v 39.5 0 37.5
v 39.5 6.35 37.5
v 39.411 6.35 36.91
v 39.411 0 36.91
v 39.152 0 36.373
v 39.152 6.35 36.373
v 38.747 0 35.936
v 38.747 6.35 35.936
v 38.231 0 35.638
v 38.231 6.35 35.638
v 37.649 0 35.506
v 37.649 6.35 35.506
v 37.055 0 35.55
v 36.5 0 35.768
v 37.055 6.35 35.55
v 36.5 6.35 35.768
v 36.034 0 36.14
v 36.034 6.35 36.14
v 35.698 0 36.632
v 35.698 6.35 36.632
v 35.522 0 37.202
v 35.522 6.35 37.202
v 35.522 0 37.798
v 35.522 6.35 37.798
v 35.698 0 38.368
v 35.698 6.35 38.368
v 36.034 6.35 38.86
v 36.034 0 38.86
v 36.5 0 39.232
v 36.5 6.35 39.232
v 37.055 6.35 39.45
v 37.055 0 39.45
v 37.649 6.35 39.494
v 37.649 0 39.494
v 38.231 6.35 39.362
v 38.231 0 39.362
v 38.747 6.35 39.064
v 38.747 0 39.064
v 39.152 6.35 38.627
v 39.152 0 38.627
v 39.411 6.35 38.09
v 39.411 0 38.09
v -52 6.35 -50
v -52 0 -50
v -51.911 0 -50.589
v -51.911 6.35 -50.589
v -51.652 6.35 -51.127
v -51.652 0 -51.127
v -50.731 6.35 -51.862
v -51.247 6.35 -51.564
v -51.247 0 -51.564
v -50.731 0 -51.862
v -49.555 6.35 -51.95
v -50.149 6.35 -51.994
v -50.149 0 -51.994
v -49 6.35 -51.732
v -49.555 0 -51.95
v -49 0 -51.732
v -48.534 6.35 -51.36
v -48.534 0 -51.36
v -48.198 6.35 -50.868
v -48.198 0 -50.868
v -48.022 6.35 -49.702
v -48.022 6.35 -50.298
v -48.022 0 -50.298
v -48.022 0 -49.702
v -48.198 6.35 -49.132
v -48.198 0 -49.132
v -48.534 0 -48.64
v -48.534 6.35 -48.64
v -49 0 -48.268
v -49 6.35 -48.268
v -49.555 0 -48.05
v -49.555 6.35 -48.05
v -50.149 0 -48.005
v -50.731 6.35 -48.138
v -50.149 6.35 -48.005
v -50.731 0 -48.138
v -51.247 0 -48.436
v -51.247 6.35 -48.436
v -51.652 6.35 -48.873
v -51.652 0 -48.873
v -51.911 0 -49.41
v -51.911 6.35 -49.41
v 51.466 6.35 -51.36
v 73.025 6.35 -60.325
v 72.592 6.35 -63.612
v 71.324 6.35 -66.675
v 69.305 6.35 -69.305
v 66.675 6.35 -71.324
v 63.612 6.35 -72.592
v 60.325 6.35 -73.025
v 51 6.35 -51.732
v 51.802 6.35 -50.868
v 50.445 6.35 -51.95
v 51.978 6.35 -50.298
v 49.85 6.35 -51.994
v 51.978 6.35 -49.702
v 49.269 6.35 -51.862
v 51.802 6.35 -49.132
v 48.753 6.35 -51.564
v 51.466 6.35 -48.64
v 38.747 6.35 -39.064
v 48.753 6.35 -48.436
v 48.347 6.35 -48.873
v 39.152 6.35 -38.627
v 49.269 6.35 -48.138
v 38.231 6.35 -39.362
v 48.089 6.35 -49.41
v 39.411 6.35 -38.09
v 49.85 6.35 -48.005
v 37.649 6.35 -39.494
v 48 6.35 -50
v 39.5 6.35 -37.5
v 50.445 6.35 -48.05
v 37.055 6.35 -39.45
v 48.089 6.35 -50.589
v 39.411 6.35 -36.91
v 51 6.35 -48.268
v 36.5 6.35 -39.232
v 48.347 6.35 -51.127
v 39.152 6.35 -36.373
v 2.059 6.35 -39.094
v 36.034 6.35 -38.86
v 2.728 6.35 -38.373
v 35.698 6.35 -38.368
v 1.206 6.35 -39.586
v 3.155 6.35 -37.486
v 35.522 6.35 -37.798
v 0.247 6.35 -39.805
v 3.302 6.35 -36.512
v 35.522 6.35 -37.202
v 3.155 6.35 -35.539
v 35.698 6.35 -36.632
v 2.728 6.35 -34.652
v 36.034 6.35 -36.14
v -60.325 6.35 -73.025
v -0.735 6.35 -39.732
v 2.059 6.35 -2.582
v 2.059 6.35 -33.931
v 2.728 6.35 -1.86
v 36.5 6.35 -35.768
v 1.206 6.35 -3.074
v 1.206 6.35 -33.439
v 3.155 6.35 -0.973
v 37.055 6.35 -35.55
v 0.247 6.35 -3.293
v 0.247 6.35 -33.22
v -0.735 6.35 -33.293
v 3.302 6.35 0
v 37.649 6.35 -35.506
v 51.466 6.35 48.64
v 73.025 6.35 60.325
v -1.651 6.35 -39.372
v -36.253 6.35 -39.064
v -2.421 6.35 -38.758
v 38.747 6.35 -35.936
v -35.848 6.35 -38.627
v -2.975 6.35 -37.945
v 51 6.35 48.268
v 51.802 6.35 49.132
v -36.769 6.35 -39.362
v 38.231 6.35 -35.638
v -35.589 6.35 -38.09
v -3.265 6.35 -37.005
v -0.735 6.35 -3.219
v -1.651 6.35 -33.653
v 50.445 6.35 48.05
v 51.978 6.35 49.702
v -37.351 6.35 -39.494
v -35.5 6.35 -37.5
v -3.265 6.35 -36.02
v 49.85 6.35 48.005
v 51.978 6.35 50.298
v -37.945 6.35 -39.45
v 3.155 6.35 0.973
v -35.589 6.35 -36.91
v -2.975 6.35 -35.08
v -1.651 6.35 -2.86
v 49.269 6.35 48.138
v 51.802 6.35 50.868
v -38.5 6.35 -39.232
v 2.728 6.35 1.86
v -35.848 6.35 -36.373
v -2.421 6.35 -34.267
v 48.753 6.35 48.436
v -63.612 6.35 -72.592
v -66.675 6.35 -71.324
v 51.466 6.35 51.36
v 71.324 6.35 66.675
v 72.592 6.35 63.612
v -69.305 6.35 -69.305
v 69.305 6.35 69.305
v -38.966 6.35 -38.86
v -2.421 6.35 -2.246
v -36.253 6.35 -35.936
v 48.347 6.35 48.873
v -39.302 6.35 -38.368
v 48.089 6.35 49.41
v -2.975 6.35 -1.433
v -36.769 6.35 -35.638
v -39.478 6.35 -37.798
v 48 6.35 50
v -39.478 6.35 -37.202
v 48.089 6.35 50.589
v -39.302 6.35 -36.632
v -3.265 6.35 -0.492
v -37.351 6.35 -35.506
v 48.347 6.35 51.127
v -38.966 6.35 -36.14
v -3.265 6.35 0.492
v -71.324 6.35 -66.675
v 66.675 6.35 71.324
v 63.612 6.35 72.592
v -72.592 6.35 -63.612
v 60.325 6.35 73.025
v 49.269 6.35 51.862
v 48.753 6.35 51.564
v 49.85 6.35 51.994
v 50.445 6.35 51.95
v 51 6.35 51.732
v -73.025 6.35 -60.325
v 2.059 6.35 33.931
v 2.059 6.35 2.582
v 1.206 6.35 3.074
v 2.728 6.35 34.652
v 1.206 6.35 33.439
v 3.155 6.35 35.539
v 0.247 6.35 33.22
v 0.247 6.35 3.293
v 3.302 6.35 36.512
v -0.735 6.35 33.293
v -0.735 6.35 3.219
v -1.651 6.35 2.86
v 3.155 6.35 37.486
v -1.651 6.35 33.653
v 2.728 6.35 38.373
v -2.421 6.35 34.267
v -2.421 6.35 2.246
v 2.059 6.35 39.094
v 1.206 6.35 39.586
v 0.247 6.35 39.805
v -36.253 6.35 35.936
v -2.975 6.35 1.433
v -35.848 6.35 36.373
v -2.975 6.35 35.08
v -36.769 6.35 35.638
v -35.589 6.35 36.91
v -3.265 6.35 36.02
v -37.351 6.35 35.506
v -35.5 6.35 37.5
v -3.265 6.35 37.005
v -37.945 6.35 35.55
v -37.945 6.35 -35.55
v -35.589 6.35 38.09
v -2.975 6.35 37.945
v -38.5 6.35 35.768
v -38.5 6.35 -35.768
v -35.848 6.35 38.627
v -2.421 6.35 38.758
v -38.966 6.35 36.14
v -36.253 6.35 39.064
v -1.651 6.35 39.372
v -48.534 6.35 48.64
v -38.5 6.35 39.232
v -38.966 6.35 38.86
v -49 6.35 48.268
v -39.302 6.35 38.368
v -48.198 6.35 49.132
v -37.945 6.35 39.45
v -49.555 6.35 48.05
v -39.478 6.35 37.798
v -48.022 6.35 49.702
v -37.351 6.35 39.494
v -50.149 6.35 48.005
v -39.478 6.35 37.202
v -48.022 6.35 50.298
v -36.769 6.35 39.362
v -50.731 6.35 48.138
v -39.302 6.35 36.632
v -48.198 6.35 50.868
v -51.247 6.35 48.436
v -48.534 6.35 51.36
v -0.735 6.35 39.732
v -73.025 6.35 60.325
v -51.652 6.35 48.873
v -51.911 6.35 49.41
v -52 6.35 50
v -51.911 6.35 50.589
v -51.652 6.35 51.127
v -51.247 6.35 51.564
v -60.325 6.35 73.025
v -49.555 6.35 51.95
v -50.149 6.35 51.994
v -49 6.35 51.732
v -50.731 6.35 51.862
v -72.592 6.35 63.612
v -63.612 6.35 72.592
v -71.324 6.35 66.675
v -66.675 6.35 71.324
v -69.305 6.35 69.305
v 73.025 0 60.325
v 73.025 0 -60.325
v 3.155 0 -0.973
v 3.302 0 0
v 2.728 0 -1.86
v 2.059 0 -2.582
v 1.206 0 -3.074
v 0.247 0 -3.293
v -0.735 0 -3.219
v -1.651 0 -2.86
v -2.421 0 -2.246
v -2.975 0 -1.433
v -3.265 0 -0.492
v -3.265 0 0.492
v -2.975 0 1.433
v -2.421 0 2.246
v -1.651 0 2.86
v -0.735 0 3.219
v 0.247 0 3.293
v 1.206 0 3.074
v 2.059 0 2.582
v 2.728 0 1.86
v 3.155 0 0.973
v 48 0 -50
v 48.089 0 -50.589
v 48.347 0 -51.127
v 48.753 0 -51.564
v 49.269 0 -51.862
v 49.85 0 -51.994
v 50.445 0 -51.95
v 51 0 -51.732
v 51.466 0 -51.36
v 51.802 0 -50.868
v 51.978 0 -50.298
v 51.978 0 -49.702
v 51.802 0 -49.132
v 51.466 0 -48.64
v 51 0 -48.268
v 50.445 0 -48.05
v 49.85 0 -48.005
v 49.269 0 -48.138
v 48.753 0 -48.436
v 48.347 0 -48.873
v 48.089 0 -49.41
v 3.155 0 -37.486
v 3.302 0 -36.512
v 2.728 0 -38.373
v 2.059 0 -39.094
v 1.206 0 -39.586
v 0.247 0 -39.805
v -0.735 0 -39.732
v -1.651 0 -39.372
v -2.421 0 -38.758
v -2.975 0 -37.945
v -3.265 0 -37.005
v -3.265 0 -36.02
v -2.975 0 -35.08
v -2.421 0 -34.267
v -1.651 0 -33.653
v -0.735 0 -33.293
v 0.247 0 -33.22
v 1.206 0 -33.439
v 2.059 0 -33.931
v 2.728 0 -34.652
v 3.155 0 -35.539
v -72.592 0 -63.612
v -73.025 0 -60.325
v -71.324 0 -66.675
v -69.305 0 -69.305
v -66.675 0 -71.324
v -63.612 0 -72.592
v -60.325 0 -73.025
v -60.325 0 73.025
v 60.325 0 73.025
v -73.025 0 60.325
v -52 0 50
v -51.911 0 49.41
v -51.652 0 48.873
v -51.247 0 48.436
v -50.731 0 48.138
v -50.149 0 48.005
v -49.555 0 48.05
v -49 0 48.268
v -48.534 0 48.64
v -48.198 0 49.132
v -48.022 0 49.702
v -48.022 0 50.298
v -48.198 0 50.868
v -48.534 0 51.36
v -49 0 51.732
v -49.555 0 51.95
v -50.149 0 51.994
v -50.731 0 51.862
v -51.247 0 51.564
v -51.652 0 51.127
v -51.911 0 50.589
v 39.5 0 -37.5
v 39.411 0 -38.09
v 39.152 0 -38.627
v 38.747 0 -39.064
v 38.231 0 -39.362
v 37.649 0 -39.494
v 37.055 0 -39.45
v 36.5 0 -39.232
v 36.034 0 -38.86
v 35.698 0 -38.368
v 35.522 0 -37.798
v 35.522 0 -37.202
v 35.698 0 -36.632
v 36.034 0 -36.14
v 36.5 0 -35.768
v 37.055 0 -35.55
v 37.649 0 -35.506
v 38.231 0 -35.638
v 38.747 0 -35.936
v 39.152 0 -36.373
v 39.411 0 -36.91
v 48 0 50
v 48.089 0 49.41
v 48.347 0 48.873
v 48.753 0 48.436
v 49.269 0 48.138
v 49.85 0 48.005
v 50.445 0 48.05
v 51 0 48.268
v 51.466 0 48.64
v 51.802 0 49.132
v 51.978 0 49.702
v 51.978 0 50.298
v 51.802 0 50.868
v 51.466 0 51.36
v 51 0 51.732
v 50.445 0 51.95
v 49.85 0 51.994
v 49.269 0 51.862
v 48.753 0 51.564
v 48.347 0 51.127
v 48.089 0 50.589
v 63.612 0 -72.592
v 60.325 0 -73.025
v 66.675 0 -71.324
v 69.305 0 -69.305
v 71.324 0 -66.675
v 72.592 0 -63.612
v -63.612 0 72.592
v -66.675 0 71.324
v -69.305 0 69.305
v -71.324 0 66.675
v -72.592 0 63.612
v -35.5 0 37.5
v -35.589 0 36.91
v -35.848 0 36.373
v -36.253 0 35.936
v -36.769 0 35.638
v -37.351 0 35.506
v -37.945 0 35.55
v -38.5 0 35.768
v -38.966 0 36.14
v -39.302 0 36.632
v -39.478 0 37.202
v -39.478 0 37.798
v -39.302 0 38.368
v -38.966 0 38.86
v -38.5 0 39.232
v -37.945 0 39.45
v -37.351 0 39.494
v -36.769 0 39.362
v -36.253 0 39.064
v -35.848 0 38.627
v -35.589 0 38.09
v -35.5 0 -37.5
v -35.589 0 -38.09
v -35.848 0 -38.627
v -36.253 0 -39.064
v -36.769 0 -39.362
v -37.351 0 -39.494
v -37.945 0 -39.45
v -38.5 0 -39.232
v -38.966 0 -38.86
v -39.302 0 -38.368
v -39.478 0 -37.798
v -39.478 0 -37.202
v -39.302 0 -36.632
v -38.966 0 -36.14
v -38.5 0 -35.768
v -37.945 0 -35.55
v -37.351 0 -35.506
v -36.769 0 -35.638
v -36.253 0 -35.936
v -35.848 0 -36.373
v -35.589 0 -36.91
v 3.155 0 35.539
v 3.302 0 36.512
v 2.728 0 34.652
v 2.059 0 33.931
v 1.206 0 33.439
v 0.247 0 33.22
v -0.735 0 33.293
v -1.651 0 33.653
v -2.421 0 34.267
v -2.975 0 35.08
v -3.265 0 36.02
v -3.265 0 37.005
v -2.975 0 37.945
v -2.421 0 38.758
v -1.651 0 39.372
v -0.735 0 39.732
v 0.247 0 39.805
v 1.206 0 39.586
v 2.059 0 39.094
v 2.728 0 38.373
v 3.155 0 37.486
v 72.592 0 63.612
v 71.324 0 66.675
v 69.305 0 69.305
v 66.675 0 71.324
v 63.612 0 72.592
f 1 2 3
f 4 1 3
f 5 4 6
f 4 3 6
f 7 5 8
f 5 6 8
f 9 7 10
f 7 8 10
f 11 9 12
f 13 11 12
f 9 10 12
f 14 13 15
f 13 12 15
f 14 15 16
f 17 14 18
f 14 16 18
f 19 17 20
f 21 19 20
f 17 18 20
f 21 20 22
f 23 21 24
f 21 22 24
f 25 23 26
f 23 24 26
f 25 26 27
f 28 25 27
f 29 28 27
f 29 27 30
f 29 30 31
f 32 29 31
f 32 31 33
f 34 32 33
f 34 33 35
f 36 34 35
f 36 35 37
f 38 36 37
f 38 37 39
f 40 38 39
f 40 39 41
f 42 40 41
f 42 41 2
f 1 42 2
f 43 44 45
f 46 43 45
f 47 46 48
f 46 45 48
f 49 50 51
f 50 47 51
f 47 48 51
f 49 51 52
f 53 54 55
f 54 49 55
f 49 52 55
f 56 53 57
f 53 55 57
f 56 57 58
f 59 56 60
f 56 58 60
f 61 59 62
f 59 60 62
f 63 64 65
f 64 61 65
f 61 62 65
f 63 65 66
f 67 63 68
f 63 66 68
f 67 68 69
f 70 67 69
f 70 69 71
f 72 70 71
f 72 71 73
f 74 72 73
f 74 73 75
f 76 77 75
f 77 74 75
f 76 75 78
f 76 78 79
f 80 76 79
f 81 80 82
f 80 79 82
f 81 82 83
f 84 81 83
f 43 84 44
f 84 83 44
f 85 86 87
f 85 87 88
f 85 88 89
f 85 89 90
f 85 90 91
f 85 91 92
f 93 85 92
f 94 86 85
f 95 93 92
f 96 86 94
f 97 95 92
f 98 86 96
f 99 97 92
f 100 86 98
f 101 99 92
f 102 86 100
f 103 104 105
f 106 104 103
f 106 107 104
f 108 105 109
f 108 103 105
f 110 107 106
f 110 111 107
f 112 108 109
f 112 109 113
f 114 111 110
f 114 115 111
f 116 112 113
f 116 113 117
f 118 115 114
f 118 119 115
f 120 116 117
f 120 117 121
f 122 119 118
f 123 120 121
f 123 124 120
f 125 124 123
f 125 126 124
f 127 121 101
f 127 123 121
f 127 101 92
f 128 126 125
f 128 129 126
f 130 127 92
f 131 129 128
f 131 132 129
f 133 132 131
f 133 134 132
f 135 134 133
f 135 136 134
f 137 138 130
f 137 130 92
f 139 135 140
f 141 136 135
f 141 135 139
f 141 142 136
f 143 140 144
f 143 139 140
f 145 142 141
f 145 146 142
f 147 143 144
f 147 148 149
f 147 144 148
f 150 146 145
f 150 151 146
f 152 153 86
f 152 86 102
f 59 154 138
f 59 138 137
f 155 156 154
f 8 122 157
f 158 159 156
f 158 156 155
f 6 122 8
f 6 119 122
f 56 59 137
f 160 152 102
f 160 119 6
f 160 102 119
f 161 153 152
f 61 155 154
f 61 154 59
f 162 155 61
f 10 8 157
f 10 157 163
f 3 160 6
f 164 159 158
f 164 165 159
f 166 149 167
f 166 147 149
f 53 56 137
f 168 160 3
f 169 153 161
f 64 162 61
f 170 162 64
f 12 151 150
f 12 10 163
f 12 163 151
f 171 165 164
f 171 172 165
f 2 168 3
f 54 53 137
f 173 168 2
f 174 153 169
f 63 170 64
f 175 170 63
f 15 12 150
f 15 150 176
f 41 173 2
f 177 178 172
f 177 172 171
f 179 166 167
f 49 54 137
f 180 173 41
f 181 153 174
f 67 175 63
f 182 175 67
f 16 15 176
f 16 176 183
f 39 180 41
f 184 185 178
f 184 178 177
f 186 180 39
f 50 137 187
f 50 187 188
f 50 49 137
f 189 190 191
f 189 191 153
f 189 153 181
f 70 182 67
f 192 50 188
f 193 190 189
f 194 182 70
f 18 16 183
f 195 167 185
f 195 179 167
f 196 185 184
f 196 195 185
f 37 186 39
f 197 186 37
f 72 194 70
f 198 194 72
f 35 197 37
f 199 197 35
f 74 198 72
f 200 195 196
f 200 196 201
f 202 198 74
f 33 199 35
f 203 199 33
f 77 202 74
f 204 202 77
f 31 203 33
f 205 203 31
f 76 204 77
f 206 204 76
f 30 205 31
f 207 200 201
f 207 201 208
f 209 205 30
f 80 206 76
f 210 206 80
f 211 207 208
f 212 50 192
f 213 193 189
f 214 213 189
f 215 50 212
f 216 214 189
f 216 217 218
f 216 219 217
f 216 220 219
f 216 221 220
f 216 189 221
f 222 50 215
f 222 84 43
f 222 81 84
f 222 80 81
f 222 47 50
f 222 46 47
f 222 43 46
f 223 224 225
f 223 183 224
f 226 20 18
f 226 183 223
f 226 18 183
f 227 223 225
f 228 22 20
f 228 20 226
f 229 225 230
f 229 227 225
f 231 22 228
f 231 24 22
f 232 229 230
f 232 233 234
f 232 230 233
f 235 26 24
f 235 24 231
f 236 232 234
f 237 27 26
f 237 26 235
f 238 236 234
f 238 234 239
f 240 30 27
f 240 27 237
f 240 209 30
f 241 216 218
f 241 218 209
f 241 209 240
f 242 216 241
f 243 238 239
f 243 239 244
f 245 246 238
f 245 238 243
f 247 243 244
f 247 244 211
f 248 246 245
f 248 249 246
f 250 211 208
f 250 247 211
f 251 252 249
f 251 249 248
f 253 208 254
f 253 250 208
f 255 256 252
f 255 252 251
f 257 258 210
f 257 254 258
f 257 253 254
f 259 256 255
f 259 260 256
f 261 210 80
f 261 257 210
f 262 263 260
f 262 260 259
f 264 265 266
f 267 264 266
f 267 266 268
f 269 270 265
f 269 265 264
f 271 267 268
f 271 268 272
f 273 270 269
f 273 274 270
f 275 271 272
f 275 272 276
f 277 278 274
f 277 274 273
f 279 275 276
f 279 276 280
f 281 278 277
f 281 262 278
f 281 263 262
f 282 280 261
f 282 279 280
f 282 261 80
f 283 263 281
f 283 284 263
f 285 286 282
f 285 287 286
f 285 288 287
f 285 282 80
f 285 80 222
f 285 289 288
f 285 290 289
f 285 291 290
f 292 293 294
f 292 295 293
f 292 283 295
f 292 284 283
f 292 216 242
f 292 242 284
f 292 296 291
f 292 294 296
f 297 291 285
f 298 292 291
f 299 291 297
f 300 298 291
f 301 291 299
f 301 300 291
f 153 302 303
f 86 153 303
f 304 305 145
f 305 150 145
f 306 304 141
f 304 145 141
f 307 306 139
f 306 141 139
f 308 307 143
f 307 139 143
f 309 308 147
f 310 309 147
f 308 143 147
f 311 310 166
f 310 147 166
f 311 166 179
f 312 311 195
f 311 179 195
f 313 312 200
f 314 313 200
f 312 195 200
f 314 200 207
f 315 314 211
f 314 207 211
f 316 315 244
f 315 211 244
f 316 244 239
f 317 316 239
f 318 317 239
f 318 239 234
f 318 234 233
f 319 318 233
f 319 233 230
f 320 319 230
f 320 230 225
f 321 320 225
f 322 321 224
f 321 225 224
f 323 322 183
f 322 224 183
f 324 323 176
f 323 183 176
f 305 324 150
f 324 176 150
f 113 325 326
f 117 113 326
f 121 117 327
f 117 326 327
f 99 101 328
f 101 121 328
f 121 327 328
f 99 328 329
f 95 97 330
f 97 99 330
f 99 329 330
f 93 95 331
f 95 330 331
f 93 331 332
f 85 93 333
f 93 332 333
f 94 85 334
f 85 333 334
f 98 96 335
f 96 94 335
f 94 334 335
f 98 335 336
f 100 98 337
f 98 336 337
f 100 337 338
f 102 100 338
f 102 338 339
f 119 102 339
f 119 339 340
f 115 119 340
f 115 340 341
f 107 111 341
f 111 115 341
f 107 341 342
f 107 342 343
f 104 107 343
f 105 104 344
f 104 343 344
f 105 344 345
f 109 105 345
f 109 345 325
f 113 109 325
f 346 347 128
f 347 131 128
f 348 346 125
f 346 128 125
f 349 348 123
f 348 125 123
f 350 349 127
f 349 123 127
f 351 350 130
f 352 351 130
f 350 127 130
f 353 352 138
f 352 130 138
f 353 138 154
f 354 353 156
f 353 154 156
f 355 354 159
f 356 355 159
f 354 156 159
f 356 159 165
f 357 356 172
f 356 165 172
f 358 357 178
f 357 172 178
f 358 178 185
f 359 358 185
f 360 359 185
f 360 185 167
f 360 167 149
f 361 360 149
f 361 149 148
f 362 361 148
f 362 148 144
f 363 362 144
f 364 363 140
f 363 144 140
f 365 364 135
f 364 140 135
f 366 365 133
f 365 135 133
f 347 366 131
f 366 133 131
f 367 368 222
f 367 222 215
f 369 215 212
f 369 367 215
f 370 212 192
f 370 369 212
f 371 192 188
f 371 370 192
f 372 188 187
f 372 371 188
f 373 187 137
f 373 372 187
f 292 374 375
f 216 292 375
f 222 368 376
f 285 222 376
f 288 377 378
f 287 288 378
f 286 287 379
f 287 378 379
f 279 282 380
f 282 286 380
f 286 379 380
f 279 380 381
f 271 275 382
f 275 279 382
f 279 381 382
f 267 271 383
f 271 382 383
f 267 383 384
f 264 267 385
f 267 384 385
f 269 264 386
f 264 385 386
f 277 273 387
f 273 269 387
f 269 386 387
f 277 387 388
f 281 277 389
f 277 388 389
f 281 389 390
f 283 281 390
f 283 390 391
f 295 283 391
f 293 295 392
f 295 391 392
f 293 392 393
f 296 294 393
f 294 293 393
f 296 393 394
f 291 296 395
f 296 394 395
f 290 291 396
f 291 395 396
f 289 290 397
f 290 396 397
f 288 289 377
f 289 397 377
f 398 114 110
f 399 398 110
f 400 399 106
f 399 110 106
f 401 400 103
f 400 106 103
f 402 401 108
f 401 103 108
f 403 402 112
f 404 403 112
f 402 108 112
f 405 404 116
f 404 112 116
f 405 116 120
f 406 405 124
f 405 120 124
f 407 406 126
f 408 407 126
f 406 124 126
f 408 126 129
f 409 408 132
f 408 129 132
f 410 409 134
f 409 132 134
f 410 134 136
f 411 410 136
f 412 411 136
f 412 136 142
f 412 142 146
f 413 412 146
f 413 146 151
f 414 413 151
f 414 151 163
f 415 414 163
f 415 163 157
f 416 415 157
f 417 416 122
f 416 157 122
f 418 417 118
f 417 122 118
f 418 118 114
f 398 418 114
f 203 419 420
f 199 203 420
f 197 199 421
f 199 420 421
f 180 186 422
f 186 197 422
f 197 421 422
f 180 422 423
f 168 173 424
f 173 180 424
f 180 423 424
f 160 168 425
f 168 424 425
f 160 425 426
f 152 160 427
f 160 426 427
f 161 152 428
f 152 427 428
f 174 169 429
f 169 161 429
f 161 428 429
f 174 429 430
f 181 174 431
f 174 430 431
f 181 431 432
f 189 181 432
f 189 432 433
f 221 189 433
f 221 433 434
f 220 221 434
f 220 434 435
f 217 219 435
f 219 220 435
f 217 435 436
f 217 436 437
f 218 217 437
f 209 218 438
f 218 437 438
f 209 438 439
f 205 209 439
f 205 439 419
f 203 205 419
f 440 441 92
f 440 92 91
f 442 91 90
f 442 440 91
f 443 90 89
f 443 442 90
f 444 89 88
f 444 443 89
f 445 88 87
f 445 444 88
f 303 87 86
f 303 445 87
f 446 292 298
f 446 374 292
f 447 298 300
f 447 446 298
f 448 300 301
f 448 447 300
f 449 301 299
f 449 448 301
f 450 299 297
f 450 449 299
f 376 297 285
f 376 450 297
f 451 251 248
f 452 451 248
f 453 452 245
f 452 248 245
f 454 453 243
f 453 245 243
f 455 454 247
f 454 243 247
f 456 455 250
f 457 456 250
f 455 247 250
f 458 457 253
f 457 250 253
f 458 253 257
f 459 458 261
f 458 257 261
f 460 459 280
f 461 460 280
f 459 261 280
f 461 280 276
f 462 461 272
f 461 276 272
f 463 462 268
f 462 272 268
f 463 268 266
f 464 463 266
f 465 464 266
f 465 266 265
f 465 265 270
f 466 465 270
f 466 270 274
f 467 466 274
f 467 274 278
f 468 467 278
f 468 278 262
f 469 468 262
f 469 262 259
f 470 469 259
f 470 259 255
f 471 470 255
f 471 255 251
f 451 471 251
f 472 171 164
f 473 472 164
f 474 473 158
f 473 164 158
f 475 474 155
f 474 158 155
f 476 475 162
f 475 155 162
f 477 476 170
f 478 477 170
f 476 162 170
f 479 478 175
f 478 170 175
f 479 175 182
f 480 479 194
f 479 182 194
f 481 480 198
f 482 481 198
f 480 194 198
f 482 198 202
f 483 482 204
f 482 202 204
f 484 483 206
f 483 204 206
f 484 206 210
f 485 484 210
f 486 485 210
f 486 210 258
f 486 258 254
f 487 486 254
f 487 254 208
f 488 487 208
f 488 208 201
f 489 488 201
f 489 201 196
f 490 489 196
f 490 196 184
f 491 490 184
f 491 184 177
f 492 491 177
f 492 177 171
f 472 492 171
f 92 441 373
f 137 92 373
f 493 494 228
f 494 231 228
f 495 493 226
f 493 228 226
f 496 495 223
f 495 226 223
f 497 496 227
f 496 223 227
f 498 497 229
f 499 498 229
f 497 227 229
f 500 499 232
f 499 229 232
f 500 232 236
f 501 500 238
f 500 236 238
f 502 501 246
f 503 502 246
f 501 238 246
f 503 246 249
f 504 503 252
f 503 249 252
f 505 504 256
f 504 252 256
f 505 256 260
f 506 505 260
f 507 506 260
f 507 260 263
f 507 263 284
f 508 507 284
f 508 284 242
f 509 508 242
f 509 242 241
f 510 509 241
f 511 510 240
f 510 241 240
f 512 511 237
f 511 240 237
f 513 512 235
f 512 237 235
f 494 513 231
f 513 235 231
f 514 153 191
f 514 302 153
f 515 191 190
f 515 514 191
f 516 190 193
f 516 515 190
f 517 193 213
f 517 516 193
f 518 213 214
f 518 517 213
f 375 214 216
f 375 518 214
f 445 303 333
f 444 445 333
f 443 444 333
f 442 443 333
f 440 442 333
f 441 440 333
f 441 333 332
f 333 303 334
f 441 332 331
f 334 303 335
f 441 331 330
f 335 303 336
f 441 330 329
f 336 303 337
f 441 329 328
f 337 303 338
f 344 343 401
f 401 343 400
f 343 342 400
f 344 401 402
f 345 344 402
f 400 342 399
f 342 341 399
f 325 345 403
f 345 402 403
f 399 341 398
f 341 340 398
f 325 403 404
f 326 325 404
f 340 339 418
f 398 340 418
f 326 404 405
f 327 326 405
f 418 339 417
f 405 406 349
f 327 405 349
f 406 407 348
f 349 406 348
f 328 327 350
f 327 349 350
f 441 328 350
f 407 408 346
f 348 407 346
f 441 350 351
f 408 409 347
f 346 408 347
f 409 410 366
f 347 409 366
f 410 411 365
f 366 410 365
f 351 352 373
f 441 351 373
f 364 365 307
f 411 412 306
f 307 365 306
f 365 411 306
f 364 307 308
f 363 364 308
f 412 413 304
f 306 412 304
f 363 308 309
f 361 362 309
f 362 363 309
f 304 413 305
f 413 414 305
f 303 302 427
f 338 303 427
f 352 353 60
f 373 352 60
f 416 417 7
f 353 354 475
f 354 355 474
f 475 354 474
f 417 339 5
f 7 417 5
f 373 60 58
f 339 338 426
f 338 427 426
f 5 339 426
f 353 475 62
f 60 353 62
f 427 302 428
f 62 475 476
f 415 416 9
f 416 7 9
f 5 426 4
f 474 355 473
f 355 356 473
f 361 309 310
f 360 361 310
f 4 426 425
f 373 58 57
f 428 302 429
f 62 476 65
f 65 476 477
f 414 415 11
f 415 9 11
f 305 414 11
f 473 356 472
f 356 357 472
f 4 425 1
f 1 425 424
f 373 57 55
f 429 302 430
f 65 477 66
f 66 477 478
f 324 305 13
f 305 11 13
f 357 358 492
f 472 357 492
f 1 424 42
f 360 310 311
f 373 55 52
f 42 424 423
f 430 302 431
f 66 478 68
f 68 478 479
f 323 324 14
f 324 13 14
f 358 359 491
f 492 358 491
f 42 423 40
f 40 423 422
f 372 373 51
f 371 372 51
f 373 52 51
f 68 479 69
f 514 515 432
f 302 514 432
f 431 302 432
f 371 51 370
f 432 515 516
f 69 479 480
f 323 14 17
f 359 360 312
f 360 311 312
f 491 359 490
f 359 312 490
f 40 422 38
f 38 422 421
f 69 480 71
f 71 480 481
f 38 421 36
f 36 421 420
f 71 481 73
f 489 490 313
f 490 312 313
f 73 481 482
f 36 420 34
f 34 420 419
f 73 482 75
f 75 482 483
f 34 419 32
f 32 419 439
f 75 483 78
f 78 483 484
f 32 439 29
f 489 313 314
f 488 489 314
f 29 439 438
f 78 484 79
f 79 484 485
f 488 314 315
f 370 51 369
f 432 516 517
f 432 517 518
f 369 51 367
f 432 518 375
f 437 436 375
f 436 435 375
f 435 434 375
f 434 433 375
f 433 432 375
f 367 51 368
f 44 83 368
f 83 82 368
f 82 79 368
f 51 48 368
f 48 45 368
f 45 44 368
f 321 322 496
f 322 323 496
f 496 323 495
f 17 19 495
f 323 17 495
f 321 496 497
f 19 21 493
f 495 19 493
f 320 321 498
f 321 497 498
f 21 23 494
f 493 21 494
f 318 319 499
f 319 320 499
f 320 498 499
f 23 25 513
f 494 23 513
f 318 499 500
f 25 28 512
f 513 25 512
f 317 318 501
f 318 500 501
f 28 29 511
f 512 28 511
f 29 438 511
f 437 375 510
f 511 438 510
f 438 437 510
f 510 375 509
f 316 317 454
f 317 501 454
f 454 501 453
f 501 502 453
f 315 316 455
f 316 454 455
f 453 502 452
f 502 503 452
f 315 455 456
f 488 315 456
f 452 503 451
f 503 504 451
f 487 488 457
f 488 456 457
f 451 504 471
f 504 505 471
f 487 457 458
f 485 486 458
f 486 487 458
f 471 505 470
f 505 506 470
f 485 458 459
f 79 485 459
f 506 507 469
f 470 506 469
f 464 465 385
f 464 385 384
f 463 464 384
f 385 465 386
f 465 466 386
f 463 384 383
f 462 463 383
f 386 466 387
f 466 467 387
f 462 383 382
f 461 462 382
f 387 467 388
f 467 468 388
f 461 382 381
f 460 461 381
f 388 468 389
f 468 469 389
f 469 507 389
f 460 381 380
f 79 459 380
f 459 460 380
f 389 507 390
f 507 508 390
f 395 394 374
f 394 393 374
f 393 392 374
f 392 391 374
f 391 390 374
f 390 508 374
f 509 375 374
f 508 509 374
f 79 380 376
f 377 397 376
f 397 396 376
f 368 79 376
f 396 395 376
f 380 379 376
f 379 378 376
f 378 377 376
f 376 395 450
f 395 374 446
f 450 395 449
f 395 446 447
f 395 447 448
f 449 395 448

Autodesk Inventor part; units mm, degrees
ref_plane "YZ Plane" through (0, 0, 0) normal (1, 0, 0) x (0, 1, 0)
ref_plane "XZ Plane" through (0, 0, 0) normal (0, 1, 0) x (-1, 0, 0)
ref_plane "XY Plane" through (0, 0, 0) normal (0, 0, 1) x (1, 0, 0)
sketch "Sketch1" plane through (0, 0, 0) normal (0, 1, 0) x (-1, 0, 0)
  line L0 (60.325, 73.025) -> (-60.325, 73.025)
  line L1 (-73.025, 60.325) -> (-73.025, -60.325)
  line L2 (-60.325, -73.025) -> (60.325, -73.025)
  line L3 (73.025, -60.325) -> (73.025, 60.325)
  circle A0 centre (49.9999, 49.9999) radius 2
  circle A1 centre (49.9999, -49.9999) radius 2
  circle A2 centre (-49.9999, -49.9999) radius 2
  circle A3 centre (-49.9999, 49.9999) radius 2
  arc A4 (73.025, 60.325) -> (60.325, 73.025) centre (60.325, 60.325) ccw
  arc A5 (60.325, -73.025) -> (73.025, -60.325) centre (60.325, -60.325) ccw
  arc A6 (-60.325, 73.025) -> (-73.025, 60.325) centre (-60.325, 60.325) ccw
  arc A7 (-73.025, -60.325) -> (-60.325, -73.025) centre (-60.325, -60.325) ccw
  point P0 (0, 0)
  point P1 (73.025, 73.025)
  point P2 (-73.025, -73.025)
  point P3 (-73.025, 73.025)
  point P4 (73.025, -73.025)
  dimension "d0" = 73.025
  dimension "d1" = 73.025
  dimension "d2" = 146.05
  dimension "d3" = 146.05
  dimension "d4" = 4
  dimension "d5" = 4
  dimension "d6" = 4
  dimension "d7" = 4
  dimension "d8" = 99.9998
  dimension "d9" = 99.9998
  dimension "d10" = 99.9998
  dimension "d11" = 99.9998
  dimension "d12" = 23.0251
  dimension "d13" = 23.0251
  dimension "d14" = 23.0251
  dimension "d15" = 23.0251
  dimension "d16" = 23.0251
  dimension "d17" = 23.0251
  dimension "d18" = 23.0251
  dimension "d19" = 23.0251
  dimension "d40" = 12.7
  dimension "d41" = 12.7
extrude "Extrusion1" add sketch "Sketch1" along normal blind 6.35
sketch "Sketch2" plane through (0, 6.35, 0) normal (0, 1, 0) x (1, 0, 0)
  circle A0 centre (-37.5, -37.5) radius 2
  circle A1 centre (-37.5, 37.5) radius 2
  circle A2 centre (37.5, -37.5) radius 2
  circle A3 centre (37.5, 37.5) radius 2
  line L0 (-60.325, -73.025) -> (60.325, -73.025) projected
  line L1 (-73.025, 60.325) -> (-73.025, -60.325) projected
  line L2 (73.025, -60.325) -> (73.025, 60.325) projected
  line L3 (60.325, 73.025) -> (-60.325, 73.025) projected
  point P0 (0, 0)
  point P1 (-76.2, -76.2)
  point P2 (76.2, -76.2)
  point P3 (-76.2, 76.2)
  point P4 (76.2, 76.2)
  point P5 (-60.325, 73.025)
  dimension "d22" = 4
  dimension "d23" = 4
  dimension "d24" = 4
  dimension "d25" = 4
  dimension "d26" = 75
  dimension "d27" = 75
  dimension "d28" = 75
  dimension "d29" = 75
  dimension "d30" = 35.525
  dimension "d31" = 35.525
  dimension "d32" = 35.525
  dimension "d33" = 35.525
  dimension "d34" = 35.525
  dimension "d35" = 35.525
  dimension "d36" = 35.525
  dimension "d37" = 35.525
extrude "Extrusion2" cut sketch "Sketch2" against normal blind 6.35
sketch "Sketch3" plane through (0, 6.35, 0) normal (0, 1, 0) x (1, 0, 0)
  circle A0 centre (0, -36.5125) radius 3.302
  circle A1 centre (0, 0) radius 3.302
  circle A2 centre (0, 36.5125) radius 3.302
  line L0 (60.325, 73.025) -> (-60.325, 73.025) projected
  line L1 (-60.325, -73.025) -> (60.325, -73.025) projected
  line L2 (73.025, -60.325) -> (73.025, 60.325) projected
  line L3 (-73.025, 60.325) -> (-73.025, -60.325) projected
  point P0 (-73.025, 0)
  dimension "d52" = 6.604
  dimension "d53" = 6.604
  dimension "d54" = 6.604
  dimension "d61" = 36.5125
  dimension "d62" = 36.5125
  dimension "d63" = 36.5125
  dimension "d64" = 36.5125
extrude "Extrusion3" cut sketch "Sketch3" against normal blind 6.35
ref_plane "Work Plane1" through (0, 0, 60.325) normal (1, 0, 0) x (0, 0, -1)
ref_plane "Work Plane2" through (-60.325, 0, 0) normal (0, 0, 1) x (1, 0, 0)
equation "\"d0\" = 0.5 * d2"
equation "\"d1\" = 0.5 * d3"
equation "\"d2\" = d3"
equation "\"d5\" = d4"
equation "\"d6\" = d4"
equation "\"d7\" = d4"
equation "\"d9\" = d8"
equation "\"d11\" = d10"
equation "\"d12\" = d17"
equation "\"d13\" = d16"
equation "\"d14\" = d13"
equation "\"d15\" = d12"
equation "\"d23\" = d22"
equation "\"d24\" = d22"
equation "\"d25\" = d22"
equation "\"d27\" = d26"
equation "\"d29\" = d28"
equation "\"d30\" = d36"
equation "\"d31\" = d37"
equation "\"d32\" = d31"
equation "\"d33\" = d30"
equation "\"d52\" = d53"
equation "\"d54\" = d53"
equation "\"d61\" = d63"
equation "\"d62\" = d64"
properties part number "VESA adapter bracket"
